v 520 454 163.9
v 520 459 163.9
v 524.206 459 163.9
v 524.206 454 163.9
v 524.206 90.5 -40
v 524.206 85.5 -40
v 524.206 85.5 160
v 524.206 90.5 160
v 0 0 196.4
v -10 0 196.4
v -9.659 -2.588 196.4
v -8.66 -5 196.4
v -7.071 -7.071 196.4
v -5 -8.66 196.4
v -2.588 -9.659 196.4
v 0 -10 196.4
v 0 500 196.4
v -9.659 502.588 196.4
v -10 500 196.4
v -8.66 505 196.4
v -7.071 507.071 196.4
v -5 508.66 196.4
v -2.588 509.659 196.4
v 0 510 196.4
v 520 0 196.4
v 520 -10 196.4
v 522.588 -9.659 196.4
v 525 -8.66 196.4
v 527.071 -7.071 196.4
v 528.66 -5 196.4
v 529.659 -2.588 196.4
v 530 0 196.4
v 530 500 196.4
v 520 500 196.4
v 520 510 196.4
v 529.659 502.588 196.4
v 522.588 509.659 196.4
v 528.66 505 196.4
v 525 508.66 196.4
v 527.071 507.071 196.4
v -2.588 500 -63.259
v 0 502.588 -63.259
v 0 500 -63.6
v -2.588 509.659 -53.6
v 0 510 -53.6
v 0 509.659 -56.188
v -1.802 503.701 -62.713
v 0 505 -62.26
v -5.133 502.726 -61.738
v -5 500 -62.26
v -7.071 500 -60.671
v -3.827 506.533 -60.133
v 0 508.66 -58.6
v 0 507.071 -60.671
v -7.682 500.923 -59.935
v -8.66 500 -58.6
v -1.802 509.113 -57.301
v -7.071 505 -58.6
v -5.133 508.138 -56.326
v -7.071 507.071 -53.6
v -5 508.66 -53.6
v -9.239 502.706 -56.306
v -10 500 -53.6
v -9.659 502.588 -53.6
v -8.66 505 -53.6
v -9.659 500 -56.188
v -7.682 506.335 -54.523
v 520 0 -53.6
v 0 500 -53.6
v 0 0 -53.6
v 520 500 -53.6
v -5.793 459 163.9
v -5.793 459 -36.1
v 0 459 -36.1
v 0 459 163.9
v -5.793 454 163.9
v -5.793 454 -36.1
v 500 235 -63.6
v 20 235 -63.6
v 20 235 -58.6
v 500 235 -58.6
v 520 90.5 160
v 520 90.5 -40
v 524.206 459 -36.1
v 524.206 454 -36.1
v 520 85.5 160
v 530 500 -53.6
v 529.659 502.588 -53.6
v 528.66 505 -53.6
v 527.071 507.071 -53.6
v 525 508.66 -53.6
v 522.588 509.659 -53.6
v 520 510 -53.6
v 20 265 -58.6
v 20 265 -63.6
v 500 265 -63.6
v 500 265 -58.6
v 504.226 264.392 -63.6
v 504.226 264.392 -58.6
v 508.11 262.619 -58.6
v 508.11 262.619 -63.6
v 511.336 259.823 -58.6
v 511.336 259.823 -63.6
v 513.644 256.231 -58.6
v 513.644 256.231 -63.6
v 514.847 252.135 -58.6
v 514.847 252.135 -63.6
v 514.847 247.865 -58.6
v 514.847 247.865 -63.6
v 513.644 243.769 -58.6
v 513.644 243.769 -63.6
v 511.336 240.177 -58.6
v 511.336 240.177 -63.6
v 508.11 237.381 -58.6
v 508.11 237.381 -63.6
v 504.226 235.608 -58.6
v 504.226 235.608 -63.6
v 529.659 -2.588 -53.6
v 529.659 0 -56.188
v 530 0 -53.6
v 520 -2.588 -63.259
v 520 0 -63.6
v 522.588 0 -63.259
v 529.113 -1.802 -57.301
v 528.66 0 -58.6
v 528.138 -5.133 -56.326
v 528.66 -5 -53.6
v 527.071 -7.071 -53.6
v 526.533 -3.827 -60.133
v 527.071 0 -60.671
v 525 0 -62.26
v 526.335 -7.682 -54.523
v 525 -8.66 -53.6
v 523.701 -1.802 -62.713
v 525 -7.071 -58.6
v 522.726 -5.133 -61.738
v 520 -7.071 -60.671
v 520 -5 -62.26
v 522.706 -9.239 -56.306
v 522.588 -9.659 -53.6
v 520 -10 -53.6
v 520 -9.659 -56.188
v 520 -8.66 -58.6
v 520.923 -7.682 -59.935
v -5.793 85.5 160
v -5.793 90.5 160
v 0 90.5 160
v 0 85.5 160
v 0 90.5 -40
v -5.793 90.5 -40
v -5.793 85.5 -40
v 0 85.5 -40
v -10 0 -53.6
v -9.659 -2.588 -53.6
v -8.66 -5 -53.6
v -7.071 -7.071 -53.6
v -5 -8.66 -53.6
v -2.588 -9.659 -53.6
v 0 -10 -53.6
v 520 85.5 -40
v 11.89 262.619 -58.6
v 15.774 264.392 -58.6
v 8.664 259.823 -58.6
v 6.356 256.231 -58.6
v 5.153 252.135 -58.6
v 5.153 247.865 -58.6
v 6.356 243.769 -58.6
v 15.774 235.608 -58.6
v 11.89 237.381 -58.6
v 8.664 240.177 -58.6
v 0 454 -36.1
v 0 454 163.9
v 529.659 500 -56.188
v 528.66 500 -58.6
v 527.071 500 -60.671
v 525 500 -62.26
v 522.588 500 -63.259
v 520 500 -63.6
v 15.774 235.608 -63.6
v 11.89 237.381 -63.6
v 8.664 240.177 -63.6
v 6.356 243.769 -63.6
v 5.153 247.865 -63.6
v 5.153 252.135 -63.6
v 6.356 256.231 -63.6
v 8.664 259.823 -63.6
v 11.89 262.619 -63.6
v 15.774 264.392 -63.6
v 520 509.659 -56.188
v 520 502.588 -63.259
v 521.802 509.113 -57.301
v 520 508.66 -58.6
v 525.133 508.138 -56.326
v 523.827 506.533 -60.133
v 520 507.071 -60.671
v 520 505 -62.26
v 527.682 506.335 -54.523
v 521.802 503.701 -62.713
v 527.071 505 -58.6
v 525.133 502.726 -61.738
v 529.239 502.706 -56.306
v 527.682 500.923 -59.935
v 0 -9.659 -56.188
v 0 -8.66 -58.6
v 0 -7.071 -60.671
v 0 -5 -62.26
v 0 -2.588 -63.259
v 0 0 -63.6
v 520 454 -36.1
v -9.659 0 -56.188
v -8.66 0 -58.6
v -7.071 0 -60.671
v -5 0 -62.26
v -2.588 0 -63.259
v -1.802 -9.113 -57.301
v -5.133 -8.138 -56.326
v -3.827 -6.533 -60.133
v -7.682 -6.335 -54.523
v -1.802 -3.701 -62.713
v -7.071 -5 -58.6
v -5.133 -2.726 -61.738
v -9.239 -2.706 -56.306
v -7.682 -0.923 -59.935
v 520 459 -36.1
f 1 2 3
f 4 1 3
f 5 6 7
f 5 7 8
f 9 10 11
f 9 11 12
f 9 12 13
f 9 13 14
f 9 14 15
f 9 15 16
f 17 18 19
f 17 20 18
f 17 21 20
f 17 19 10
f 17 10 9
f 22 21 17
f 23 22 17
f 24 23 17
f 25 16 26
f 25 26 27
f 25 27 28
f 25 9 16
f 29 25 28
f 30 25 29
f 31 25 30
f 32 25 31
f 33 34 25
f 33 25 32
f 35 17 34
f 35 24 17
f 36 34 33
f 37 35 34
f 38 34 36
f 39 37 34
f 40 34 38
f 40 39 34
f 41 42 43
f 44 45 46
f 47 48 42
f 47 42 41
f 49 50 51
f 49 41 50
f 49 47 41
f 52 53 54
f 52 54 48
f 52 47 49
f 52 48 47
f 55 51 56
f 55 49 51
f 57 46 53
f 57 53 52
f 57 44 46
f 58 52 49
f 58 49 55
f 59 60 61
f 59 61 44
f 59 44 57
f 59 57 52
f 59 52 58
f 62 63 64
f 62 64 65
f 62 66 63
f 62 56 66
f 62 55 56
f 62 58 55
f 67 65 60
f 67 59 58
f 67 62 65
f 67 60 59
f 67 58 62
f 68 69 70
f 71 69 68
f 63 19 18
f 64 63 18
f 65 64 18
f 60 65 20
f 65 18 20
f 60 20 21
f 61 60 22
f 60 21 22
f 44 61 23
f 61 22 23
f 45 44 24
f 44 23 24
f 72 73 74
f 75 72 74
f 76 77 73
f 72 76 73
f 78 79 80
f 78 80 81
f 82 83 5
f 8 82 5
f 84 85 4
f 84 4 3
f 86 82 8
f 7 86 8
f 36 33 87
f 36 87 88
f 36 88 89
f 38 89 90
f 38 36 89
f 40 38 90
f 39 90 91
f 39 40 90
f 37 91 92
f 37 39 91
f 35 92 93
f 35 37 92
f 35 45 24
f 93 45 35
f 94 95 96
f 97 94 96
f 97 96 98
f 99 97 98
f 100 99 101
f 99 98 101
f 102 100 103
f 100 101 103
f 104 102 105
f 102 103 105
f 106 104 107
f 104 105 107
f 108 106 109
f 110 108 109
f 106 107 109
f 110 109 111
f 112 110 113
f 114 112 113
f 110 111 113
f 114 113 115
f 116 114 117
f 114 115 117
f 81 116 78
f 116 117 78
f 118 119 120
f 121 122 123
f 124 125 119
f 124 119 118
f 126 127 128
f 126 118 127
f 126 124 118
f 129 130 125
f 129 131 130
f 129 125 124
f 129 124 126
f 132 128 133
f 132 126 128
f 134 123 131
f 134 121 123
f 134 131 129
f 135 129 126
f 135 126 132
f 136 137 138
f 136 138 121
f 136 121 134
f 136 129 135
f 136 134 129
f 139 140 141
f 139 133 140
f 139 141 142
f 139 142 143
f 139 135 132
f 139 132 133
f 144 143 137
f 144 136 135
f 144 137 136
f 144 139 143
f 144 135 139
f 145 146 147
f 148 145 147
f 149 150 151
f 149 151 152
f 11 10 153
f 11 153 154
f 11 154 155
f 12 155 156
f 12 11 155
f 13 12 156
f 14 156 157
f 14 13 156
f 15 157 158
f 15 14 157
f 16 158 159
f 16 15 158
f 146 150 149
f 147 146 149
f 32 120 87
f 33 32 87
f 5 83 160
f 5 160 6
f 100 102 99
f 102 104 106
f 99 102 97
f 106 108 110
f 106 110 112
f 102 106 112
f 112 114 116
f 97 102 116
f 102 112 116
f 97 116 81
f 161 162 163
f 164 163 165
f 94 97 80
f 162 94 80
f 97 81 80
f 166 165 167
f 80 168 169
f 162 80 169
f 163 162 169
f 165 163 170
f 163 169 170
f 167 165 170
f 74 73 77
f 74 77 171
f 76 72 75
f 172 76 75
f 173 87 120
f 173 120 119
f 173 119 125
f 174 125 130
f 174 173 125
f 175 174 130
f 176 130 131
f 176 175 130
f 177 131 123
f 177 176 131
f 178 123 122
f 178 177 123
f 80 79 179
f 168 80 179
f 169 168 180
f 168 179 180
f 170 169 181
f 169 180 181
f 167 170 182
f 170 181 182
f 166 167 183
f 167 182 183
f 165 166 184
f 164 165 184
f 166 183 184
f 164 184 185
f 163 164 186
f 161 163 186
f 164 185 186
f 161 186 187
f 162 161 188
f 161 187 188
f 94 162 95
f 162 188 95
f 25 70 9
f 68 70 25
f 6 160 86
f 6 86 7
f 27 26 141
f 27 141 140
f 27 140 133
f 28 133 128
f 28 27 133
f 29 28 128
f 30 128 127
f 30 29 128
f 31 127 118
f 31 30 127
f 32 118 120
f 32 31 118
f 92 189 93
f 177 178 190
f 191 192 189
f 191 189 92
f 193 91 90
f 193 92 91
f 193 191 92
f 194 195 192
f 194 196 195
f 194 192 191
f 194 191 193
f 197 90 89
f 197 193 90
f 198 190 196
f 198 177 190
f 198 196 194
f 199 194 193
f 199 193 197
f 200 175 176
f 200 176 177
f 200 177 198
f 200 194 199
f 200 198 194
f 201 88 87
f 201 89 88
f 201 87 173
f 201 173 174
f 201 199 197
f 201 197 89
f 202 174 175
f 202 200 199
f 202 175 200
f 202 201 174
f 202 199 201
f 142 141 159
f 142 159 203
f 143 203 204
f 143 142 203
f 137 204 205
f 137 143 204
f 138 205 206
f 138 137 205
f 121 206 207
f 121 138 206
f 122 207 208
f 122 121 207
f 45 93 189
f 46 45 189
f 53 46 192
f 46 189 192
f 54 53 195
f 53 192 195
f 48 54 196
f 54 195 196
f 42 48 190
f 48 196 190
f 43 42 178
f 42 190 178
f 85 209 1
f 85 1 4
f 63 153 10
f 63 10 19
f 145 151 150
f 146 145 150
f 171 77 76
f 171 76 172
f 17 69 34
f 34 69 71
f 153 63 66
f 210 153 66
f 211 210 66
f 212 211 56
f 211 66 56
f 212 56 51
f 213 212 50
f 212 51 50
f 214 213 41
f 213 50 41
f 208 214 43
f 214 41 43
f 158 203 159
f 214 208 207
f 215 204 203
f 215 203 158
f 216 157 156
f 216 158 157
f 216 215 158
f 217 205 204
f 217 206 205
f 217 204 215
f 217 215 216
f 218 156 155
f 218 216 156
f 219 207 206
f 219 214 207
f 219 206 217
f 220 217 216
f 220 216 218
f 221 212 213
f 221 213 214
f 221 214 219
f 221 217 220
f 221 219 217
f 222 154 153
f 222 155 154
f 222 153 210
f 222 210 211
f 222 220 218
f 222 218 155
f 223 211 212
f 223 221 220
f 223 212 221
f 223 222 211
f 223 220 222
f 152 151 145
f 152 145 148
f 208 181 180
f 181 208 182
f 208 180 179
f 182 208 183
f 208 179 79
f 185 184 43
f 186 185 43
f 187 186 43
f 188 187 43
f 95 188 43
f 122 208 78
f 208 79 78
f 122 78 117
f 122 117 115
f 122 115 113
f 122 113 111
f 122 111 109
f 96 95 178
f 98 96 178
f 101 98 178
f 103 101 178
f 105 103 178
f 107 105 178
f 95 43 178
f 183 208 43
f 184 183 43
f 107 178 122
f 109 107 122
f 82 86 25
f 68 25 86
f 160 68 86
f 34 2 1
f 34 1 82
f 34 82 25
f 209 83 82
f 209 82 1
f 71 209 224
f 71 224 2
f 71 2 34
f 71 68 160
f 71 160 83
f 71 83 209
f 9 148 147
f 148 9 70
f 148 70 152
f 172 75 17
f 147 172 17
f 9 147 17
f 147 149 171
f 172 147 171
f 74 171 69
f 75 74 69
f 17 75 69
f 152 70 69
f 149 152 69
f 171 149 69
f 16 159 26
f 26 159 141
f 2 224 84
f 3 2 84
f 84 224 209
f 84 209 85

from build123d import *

# Parameters (mm, degrees)
EXTRUDE_DEPTH  = 5
BOX019_W       = 530
BOX019_H       = 5
BOX019_DEPTH   = 200
BOX020_W       = 530
BOX020_H       = 5
BOX020_DEPTH   = 200
BOX021_W       = 520
BOX021_H       = 500
BOX021_DEPTH   = 250
THICKNESS001_T = 10


with BuildPart() as extrude_body:
    # Sketch (on Face43 of Cut004) → Extrude (new body)
    with BuildSketch(Plane(origin=(0, 0, -63.6), x_dir=(1, 0, 0), z_dir=(0, 0, -1))):
        with BuildLine():
            Line((20, -235), (500, -235))
            ThreePointArc((500, -265), (515, -250), (500, -235))
            Line((20, -265), (500, -265))
            ThreePointArc((20, -235), (5, -250), (20, -265))
        make_face()
    extrude(amount=-EXTRUDE_DEPTH)


with BuildPart() as supportrail003:
    # Box019 → Box019 (new body)
    with BuildSketch(Plane(origin=(-5.7935, 85.5, 13.6), x_dir=(1, 0, 0), z_dir=(0, 0, 1))):
        with Locations((265, 2.5)):
            Rectangle(BOX019_W, BOX019_H)
    extrude(amount=BOX019_DEPTH)


with BuildPart() as supportrail004:
    # Box020 → Box020 (new body)
    with BuildSketch(Plane(origin=(-5.7935, 454, 17.5), x_dir=(1, 0, 0), z_dir=(0, 0, 1))):
        with Locations((265, 2.5)):
            Rectangle(BOX020_W, BOX020_H)
    extrude(amount=BOX020_DEPTH)


with BuildPart() as box:
    # Box021 → Box021 (new body)
    with BuildSketch(Plane.XY):
        with Locations((260, 250)):
            Rectangle(BOX021_W, BOX021_H)
    extrude(amount=BOX021_DEPTH)

    # Thickness001
    thickness001_openings = [box.faces().sort_by_distance(p)[0] for p in [
        (260, 250, 250),
    ]]
    offset(amount=THICKNESS001_T, openings=thickness001_openings)

    # Cut003: cut SupportRail004
    add(supportrail004.part, mode=Mode.SUBTRACT)

    # Cut004: cut SupportRail003
    add(supportrail003.part, mode=Mode.SUBTRACT)


with BuildPart() as box_1:
    # Cut004 placement: moved
    add(box.part.moved(Location((0, 0, -53.6))))

    # Cut005: cut Extrude body
    add(extrude_body.part, mode=Mode.SUBTRACT)


solid = box_1.part
